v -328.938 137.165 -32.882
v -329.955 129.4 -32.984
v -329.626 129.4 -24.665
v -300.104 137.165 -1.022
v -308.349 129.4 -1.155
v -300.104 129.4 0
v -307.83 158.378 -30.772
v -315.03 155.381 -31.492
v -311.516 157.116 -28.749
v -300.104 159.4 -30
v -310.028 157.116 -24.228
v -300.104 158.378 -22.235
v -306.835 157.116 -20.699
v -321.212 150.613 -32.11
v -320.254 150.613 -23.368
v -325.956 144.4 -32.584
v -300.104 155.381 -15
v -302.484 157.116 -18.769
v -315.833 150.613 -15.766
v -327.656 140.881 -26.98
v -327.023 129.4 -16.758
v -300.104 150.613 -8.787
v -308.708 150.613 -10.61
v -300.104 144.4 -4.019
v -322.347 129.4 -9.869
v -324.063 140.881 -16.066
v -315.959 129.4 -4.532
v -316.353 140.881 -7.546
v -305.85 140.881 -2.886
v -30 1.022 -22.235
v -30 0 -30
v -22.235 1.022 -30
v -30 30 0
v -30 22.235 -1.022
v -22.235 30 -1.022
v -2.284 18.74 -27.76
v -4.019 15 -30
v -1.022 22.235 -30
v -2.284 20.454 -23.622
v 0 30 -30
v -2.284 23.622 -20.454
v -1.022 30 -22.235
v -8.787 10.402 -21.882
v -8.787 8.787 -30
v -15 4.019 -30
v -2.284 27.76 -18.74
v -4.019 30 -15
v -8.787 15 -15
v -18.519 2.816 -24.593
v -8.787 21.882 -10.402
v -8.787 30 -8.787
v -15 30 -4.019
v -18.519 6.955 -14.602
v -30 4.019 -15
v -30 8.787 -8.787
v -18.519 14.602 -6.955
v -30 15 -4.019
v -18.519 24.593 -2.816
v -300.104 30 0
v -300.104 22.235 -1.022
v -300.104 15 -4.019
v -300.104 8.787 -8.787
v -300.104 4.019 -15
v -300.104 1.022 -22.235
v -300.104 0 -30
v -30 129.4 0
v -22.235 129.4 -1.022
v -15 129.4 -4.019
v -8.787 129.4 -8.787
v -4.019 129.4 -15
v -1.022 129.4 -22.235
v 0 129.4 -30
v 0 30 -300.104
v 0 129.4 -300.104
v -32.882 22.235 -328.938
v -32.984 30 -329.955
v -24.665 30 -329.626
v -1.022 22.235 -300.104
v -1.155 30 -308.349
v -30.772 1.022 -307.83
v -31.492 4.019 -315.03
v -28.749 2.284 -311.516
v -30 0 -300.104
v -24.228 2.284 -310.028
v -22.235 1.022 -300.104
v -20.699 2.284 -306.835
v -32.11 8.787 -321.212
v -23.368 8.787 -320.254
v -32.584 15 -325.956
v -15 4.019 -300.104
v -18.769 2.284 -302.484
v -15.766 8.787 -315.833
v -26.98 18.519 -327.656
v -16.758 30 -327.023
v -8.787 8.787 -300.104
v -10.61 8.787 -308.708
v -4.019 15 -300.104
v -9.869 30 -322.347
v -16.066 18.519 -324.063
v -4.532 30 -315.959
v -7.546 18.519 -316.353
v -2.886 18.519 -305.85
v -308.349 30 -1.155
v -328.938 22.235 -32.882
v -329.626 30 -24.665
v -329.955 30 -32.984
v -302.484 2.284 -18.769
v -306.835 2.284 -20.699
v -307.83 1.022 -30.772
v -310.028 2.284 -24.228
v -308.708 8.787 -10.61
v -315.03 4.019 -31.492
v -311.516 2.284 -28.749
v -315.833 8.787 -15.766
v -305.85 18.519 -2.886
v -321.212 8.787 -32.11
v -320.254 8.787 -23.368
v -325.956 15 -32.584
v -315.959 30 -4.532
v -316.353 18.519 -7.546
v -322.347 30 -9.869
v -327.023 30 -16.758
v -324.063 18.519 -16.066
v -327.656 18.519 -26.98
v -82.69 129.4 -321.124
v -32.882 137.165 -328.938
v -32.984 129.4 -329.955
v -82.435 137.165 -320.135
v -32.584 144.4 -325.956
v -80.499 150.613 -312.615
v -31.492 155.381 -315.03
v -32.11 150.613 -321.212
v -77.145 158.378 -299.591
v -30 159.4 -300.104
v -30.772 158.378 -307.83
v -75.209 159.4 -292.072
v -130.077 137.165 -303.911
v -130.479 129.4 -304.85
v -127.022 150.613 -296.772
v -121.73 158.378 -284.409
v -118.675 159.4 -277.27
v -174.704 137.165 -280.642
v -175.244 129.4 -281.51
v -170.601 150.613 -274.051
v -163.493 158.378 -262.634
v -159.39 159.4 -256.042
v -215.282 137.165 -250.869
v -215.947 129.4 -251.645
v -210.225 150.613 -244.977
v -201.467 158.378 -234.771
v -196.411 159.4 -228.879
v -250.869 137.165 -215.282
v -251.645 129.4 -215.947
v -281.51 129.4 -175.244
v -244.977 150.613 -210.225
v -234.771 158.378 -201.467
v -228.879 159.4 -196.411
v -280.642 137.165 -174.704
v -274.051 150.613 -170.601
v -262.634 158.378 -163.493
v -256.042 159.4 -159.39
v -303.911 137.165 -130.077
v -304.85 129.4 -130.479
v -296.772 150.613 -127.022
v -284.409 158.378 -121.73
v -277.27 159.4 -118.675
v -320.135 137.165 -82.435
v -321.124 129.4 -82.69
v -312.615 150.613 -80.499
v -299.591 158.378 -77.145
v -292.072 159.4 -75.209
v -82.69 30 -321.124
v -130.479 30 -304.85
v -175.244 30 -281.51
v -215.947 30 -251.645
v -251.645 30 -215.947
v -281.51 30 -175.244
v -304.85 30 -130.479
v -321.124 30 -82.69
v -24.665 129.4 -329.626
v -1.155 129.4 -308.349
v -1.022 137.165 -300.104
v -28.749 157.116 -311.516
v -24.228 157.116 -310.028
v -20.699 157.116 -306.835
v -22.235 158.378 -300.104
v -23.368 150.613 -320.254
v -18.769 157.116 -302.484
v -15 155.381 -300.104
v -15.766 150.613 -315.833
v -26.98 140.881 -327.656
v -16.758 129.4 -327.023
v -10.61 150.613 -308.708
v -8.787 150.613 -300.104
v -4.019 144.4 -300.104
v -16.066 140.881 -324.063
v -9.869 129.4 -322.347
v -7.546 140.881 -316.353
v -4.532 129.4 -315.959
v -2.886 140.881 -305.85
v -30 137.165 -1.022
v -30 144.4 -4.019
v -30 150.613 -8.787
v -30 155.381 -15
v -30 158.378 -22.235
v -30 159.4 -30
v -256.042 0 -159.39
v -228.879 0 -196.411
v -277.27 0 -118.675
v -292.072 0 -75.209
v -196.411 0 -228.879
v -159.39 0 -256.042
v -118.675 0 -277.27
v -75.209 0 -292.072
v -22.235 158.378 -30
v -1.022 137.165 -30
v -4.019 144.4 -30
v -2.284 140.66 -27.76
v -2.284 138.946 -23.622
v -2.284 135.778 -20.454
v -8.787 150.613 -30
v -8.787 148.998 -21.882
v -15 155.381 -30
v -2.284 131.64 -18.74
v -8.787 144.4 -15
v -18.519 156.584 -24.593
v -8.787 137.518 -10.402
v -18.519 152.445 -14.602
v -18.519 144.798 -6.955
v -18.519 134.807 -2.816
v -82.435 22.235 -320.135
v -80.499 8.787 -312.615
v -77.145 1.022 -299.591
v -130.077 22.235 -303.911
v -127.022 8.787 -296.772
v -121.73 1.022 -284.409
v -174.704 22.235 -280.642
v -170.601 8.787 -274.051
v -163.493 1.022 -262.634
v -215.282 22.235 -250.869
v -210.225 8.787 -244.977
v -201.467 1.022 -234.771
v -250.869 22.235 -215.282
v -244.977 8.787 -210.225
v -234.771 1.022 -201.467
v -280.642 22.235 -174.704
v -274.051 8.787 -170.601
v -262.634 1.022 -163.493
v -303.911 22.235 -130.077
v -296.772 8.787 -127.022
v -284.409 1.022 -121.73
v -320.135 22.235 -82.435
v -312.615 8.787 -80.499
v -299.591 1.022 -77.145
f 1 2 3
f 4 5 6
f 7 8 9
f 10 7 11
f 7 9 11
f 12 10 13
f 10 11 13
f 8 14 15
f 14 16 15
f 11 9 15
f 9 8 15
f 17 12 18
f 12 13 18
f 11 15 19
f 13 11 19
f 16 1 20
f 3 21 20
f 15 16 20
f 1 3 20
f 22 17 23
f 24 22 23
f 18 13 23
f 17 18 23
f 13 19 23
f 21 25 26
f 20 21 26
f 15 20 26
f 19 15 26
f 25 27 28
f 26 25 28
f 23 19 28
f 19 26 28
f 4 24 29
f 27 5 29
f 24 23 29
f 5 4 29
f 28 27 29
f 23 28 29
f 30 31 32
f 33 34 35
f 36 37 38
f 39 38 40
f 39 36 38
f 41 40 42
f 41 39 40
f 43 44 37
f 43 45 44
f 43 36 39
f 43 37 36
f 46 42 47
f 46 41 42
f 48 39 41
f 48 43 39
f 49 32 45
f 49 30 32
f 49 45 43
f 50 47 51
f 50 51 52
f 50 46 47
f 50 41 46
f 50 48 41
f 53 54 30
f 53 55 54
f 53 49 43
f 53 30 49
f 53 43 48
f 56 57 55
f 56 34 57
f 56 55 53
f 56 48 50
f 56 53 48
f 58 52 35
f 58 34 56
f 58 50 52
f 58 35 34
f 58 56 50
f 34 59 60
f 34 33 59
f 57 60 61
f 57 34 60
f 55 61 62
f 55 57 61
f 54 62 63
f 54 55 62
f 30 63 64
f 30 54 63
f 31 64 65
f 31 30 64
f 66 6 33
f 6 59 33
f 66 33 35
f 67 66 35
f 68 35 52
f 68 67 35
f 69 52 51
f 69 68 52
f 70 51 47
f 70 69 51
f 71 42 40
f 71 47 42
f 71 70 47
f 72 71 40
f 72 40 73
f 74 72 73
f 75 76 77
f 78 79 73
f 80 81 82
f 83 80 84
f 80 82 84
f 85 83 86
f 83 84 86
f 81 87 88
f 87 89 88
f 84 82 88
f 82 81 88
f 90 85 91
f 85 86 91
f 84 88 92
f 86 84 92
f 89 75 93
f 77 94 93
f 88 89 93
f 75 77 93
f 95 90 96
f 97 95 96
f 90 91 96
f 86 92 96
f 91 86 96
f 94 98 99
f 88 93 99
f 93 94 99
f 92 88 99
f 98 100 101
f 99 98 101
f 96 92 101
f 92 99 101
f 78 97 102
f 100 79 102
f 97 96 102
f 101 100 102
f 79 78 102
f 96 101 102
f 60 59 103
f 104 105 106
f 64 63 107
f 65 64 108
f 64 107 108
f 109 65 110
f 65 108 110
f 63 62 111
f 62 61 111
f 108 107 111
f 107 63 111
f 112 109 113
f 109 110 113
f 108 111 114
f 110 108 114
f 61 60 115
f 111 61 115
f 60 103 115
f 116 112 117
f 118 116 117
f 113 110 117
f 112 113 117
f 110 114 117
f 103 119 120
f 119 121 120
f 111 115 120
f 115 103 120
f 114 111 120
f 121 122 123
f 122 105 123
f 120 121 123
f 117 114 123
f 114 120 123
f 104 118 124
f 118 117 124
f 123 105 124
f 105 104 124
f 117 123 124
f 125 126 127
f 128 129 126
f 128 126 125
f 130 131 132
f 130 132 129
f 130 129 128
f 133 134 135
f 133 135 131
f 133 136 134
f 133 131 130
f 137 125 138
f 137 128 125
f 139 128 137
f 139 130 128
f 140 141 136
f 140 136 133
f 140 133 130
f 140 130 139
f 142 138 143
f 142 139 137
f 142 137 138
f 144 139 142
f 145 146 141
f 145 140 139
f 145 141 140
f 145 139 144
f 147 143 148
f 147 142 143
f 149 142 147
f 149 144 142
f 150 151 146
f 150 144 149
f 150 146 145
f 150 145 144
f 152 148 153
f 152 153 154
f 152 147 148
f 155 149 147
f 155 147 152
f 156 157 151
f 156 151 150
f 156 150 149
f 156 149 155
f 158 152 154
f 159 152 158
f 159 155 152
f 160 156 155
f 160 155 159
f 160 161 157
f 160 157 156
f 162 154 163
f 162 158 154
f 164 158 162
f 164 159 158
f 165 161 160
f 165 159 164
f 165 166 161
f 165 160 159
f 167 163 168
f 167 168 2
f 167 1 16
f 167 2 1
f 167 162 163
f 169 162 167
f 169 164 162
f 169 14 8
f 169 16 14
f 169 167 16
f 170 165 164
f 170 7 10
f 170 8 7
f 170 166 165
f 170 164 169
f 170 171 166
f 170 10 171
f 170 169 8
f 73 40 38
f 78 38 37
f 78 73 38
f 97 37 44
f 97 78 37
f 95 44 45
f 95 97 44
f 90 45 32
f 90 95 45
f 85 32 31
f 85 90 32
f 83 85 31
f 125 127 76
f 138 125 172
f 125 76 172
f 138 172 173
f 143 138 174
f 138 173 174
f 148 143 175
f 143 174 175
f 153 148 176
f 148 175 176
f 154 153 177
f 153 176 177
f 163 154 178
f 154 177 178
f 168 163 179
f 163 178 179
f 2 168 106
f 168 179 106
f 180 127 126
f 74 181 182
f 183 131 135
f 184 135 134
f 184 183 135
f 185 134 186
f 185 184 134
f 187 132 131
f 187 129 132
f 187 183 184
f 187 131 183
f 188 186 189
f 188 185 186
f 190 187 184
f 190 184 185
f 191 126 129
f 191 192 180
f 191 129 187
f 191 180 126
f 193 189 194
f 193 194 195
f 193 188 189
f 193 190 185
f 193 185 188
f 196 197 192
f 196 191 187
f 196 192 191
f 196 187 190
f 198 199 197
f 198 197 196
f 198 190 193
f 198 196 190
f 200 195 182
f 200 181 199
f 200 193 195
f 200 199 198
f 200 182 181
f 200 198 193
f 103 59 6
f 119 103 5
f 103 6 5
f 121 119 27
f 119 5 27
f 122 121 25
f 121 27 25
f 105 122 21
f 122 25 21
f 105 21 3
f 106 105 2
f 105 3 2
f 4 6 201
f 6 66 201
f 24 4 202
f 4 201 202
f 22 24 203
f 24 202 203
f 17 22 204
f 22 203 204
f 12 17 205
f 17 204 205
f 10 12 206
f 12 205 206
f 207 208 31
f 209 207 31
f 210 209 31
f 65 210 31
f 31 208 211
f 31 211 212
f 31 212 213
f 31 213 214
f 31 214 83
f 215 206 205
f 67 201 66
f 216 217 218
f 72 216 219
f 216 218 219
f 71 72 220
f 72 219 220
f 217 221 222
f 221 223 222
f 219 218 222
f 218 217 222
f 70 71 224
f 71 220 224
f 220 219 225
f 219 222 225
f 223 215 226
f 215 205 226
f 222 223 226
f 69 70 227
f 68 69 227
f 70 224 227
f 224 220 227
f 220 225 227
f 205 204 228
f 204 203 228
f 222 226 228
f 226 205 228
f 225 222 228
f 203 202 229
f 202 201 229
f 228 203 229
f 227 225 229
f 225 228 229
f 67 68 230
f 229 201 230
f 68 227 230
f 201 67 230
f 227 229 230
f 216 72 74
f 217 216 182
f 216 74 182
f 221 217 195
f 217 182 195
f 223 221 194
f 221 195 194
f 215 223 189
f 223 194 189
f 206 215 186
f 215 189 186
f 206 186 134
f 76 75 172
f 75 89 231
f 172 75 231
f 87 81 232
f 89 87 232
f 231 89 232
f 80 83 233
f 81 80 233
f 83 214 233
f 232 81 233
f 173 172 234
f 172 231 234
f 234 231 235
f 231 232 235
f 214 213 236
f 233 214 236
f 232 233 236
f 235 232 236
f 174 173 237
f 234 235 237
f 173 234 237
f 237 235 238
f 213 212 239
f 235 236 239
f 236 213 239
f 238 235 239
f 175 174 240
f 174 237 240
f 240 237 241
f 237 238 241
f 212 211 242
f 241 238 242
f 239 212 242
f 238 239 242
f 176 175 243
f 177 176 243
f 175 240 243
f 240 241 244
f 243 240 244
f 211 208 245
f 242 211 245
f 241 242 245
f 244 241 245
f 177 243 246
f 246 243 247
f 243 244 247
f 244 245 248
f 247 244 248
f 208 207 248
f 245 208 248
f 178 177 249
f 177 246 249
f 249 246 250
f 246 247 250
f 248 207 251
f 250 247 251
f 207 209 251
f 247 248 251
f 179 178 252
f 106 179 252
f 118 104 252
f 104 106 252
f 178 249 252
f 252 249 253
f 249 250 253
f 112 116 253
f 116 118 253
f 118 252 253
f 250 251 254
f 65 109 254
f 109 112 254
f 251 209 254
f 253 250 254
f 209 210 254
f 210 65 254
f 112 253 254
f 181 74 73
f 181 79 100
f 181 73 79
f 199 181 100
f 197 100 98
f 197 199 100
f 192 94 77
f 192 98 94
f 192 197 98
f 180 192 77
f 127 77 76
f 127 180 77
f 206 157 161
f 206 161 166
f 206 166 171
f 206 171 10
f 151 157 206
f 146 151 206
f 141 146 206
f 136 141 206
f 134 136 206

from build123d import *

# Parameters (mm, degrees)
BOSS_EXTRUDE1_DEPTH = 159.4
FILLET1_R           = 30


with BuildPart() as part:
    # Sketch1 → Boss-Extrude1 (new body)
    with BuildSketch(Plane(origin=(0, 0, 0), x_dir=(1, 0, 0), z_dir=(0, 1, 0))):
        with BuildLine():
            Line((-331.6, 0), (0, 0))
            Line((0, 0), (0, 331.6))
            ThreePointArc((0, 331.6), (-234.476608641, 234.476608641), (-331.6, 0))
        make_face()
    extrude(amount=BOSS_EXTRUDE1_DEPTH)

    # Fillet1
    fillet1_edges = [part.edges().sort_by_distance(p)[0] for p in [
        (-165.8, 159.4, 0),
        (-165.8, 0, 0),
        (-234.476608641, 0, -234.476608641),
        (0, 0, -165.8),
        (0, 159.4, -165.8),
        (0, 79.7, 0),
        (-331.6, 79.7, 0),
        (0, 79.7, -331.6),
        (-234.476608641, 159.4, -234.476608641),
    ]]
    fillet(fillet1_edges, radius=FILLET1_R)


solid = part.part
